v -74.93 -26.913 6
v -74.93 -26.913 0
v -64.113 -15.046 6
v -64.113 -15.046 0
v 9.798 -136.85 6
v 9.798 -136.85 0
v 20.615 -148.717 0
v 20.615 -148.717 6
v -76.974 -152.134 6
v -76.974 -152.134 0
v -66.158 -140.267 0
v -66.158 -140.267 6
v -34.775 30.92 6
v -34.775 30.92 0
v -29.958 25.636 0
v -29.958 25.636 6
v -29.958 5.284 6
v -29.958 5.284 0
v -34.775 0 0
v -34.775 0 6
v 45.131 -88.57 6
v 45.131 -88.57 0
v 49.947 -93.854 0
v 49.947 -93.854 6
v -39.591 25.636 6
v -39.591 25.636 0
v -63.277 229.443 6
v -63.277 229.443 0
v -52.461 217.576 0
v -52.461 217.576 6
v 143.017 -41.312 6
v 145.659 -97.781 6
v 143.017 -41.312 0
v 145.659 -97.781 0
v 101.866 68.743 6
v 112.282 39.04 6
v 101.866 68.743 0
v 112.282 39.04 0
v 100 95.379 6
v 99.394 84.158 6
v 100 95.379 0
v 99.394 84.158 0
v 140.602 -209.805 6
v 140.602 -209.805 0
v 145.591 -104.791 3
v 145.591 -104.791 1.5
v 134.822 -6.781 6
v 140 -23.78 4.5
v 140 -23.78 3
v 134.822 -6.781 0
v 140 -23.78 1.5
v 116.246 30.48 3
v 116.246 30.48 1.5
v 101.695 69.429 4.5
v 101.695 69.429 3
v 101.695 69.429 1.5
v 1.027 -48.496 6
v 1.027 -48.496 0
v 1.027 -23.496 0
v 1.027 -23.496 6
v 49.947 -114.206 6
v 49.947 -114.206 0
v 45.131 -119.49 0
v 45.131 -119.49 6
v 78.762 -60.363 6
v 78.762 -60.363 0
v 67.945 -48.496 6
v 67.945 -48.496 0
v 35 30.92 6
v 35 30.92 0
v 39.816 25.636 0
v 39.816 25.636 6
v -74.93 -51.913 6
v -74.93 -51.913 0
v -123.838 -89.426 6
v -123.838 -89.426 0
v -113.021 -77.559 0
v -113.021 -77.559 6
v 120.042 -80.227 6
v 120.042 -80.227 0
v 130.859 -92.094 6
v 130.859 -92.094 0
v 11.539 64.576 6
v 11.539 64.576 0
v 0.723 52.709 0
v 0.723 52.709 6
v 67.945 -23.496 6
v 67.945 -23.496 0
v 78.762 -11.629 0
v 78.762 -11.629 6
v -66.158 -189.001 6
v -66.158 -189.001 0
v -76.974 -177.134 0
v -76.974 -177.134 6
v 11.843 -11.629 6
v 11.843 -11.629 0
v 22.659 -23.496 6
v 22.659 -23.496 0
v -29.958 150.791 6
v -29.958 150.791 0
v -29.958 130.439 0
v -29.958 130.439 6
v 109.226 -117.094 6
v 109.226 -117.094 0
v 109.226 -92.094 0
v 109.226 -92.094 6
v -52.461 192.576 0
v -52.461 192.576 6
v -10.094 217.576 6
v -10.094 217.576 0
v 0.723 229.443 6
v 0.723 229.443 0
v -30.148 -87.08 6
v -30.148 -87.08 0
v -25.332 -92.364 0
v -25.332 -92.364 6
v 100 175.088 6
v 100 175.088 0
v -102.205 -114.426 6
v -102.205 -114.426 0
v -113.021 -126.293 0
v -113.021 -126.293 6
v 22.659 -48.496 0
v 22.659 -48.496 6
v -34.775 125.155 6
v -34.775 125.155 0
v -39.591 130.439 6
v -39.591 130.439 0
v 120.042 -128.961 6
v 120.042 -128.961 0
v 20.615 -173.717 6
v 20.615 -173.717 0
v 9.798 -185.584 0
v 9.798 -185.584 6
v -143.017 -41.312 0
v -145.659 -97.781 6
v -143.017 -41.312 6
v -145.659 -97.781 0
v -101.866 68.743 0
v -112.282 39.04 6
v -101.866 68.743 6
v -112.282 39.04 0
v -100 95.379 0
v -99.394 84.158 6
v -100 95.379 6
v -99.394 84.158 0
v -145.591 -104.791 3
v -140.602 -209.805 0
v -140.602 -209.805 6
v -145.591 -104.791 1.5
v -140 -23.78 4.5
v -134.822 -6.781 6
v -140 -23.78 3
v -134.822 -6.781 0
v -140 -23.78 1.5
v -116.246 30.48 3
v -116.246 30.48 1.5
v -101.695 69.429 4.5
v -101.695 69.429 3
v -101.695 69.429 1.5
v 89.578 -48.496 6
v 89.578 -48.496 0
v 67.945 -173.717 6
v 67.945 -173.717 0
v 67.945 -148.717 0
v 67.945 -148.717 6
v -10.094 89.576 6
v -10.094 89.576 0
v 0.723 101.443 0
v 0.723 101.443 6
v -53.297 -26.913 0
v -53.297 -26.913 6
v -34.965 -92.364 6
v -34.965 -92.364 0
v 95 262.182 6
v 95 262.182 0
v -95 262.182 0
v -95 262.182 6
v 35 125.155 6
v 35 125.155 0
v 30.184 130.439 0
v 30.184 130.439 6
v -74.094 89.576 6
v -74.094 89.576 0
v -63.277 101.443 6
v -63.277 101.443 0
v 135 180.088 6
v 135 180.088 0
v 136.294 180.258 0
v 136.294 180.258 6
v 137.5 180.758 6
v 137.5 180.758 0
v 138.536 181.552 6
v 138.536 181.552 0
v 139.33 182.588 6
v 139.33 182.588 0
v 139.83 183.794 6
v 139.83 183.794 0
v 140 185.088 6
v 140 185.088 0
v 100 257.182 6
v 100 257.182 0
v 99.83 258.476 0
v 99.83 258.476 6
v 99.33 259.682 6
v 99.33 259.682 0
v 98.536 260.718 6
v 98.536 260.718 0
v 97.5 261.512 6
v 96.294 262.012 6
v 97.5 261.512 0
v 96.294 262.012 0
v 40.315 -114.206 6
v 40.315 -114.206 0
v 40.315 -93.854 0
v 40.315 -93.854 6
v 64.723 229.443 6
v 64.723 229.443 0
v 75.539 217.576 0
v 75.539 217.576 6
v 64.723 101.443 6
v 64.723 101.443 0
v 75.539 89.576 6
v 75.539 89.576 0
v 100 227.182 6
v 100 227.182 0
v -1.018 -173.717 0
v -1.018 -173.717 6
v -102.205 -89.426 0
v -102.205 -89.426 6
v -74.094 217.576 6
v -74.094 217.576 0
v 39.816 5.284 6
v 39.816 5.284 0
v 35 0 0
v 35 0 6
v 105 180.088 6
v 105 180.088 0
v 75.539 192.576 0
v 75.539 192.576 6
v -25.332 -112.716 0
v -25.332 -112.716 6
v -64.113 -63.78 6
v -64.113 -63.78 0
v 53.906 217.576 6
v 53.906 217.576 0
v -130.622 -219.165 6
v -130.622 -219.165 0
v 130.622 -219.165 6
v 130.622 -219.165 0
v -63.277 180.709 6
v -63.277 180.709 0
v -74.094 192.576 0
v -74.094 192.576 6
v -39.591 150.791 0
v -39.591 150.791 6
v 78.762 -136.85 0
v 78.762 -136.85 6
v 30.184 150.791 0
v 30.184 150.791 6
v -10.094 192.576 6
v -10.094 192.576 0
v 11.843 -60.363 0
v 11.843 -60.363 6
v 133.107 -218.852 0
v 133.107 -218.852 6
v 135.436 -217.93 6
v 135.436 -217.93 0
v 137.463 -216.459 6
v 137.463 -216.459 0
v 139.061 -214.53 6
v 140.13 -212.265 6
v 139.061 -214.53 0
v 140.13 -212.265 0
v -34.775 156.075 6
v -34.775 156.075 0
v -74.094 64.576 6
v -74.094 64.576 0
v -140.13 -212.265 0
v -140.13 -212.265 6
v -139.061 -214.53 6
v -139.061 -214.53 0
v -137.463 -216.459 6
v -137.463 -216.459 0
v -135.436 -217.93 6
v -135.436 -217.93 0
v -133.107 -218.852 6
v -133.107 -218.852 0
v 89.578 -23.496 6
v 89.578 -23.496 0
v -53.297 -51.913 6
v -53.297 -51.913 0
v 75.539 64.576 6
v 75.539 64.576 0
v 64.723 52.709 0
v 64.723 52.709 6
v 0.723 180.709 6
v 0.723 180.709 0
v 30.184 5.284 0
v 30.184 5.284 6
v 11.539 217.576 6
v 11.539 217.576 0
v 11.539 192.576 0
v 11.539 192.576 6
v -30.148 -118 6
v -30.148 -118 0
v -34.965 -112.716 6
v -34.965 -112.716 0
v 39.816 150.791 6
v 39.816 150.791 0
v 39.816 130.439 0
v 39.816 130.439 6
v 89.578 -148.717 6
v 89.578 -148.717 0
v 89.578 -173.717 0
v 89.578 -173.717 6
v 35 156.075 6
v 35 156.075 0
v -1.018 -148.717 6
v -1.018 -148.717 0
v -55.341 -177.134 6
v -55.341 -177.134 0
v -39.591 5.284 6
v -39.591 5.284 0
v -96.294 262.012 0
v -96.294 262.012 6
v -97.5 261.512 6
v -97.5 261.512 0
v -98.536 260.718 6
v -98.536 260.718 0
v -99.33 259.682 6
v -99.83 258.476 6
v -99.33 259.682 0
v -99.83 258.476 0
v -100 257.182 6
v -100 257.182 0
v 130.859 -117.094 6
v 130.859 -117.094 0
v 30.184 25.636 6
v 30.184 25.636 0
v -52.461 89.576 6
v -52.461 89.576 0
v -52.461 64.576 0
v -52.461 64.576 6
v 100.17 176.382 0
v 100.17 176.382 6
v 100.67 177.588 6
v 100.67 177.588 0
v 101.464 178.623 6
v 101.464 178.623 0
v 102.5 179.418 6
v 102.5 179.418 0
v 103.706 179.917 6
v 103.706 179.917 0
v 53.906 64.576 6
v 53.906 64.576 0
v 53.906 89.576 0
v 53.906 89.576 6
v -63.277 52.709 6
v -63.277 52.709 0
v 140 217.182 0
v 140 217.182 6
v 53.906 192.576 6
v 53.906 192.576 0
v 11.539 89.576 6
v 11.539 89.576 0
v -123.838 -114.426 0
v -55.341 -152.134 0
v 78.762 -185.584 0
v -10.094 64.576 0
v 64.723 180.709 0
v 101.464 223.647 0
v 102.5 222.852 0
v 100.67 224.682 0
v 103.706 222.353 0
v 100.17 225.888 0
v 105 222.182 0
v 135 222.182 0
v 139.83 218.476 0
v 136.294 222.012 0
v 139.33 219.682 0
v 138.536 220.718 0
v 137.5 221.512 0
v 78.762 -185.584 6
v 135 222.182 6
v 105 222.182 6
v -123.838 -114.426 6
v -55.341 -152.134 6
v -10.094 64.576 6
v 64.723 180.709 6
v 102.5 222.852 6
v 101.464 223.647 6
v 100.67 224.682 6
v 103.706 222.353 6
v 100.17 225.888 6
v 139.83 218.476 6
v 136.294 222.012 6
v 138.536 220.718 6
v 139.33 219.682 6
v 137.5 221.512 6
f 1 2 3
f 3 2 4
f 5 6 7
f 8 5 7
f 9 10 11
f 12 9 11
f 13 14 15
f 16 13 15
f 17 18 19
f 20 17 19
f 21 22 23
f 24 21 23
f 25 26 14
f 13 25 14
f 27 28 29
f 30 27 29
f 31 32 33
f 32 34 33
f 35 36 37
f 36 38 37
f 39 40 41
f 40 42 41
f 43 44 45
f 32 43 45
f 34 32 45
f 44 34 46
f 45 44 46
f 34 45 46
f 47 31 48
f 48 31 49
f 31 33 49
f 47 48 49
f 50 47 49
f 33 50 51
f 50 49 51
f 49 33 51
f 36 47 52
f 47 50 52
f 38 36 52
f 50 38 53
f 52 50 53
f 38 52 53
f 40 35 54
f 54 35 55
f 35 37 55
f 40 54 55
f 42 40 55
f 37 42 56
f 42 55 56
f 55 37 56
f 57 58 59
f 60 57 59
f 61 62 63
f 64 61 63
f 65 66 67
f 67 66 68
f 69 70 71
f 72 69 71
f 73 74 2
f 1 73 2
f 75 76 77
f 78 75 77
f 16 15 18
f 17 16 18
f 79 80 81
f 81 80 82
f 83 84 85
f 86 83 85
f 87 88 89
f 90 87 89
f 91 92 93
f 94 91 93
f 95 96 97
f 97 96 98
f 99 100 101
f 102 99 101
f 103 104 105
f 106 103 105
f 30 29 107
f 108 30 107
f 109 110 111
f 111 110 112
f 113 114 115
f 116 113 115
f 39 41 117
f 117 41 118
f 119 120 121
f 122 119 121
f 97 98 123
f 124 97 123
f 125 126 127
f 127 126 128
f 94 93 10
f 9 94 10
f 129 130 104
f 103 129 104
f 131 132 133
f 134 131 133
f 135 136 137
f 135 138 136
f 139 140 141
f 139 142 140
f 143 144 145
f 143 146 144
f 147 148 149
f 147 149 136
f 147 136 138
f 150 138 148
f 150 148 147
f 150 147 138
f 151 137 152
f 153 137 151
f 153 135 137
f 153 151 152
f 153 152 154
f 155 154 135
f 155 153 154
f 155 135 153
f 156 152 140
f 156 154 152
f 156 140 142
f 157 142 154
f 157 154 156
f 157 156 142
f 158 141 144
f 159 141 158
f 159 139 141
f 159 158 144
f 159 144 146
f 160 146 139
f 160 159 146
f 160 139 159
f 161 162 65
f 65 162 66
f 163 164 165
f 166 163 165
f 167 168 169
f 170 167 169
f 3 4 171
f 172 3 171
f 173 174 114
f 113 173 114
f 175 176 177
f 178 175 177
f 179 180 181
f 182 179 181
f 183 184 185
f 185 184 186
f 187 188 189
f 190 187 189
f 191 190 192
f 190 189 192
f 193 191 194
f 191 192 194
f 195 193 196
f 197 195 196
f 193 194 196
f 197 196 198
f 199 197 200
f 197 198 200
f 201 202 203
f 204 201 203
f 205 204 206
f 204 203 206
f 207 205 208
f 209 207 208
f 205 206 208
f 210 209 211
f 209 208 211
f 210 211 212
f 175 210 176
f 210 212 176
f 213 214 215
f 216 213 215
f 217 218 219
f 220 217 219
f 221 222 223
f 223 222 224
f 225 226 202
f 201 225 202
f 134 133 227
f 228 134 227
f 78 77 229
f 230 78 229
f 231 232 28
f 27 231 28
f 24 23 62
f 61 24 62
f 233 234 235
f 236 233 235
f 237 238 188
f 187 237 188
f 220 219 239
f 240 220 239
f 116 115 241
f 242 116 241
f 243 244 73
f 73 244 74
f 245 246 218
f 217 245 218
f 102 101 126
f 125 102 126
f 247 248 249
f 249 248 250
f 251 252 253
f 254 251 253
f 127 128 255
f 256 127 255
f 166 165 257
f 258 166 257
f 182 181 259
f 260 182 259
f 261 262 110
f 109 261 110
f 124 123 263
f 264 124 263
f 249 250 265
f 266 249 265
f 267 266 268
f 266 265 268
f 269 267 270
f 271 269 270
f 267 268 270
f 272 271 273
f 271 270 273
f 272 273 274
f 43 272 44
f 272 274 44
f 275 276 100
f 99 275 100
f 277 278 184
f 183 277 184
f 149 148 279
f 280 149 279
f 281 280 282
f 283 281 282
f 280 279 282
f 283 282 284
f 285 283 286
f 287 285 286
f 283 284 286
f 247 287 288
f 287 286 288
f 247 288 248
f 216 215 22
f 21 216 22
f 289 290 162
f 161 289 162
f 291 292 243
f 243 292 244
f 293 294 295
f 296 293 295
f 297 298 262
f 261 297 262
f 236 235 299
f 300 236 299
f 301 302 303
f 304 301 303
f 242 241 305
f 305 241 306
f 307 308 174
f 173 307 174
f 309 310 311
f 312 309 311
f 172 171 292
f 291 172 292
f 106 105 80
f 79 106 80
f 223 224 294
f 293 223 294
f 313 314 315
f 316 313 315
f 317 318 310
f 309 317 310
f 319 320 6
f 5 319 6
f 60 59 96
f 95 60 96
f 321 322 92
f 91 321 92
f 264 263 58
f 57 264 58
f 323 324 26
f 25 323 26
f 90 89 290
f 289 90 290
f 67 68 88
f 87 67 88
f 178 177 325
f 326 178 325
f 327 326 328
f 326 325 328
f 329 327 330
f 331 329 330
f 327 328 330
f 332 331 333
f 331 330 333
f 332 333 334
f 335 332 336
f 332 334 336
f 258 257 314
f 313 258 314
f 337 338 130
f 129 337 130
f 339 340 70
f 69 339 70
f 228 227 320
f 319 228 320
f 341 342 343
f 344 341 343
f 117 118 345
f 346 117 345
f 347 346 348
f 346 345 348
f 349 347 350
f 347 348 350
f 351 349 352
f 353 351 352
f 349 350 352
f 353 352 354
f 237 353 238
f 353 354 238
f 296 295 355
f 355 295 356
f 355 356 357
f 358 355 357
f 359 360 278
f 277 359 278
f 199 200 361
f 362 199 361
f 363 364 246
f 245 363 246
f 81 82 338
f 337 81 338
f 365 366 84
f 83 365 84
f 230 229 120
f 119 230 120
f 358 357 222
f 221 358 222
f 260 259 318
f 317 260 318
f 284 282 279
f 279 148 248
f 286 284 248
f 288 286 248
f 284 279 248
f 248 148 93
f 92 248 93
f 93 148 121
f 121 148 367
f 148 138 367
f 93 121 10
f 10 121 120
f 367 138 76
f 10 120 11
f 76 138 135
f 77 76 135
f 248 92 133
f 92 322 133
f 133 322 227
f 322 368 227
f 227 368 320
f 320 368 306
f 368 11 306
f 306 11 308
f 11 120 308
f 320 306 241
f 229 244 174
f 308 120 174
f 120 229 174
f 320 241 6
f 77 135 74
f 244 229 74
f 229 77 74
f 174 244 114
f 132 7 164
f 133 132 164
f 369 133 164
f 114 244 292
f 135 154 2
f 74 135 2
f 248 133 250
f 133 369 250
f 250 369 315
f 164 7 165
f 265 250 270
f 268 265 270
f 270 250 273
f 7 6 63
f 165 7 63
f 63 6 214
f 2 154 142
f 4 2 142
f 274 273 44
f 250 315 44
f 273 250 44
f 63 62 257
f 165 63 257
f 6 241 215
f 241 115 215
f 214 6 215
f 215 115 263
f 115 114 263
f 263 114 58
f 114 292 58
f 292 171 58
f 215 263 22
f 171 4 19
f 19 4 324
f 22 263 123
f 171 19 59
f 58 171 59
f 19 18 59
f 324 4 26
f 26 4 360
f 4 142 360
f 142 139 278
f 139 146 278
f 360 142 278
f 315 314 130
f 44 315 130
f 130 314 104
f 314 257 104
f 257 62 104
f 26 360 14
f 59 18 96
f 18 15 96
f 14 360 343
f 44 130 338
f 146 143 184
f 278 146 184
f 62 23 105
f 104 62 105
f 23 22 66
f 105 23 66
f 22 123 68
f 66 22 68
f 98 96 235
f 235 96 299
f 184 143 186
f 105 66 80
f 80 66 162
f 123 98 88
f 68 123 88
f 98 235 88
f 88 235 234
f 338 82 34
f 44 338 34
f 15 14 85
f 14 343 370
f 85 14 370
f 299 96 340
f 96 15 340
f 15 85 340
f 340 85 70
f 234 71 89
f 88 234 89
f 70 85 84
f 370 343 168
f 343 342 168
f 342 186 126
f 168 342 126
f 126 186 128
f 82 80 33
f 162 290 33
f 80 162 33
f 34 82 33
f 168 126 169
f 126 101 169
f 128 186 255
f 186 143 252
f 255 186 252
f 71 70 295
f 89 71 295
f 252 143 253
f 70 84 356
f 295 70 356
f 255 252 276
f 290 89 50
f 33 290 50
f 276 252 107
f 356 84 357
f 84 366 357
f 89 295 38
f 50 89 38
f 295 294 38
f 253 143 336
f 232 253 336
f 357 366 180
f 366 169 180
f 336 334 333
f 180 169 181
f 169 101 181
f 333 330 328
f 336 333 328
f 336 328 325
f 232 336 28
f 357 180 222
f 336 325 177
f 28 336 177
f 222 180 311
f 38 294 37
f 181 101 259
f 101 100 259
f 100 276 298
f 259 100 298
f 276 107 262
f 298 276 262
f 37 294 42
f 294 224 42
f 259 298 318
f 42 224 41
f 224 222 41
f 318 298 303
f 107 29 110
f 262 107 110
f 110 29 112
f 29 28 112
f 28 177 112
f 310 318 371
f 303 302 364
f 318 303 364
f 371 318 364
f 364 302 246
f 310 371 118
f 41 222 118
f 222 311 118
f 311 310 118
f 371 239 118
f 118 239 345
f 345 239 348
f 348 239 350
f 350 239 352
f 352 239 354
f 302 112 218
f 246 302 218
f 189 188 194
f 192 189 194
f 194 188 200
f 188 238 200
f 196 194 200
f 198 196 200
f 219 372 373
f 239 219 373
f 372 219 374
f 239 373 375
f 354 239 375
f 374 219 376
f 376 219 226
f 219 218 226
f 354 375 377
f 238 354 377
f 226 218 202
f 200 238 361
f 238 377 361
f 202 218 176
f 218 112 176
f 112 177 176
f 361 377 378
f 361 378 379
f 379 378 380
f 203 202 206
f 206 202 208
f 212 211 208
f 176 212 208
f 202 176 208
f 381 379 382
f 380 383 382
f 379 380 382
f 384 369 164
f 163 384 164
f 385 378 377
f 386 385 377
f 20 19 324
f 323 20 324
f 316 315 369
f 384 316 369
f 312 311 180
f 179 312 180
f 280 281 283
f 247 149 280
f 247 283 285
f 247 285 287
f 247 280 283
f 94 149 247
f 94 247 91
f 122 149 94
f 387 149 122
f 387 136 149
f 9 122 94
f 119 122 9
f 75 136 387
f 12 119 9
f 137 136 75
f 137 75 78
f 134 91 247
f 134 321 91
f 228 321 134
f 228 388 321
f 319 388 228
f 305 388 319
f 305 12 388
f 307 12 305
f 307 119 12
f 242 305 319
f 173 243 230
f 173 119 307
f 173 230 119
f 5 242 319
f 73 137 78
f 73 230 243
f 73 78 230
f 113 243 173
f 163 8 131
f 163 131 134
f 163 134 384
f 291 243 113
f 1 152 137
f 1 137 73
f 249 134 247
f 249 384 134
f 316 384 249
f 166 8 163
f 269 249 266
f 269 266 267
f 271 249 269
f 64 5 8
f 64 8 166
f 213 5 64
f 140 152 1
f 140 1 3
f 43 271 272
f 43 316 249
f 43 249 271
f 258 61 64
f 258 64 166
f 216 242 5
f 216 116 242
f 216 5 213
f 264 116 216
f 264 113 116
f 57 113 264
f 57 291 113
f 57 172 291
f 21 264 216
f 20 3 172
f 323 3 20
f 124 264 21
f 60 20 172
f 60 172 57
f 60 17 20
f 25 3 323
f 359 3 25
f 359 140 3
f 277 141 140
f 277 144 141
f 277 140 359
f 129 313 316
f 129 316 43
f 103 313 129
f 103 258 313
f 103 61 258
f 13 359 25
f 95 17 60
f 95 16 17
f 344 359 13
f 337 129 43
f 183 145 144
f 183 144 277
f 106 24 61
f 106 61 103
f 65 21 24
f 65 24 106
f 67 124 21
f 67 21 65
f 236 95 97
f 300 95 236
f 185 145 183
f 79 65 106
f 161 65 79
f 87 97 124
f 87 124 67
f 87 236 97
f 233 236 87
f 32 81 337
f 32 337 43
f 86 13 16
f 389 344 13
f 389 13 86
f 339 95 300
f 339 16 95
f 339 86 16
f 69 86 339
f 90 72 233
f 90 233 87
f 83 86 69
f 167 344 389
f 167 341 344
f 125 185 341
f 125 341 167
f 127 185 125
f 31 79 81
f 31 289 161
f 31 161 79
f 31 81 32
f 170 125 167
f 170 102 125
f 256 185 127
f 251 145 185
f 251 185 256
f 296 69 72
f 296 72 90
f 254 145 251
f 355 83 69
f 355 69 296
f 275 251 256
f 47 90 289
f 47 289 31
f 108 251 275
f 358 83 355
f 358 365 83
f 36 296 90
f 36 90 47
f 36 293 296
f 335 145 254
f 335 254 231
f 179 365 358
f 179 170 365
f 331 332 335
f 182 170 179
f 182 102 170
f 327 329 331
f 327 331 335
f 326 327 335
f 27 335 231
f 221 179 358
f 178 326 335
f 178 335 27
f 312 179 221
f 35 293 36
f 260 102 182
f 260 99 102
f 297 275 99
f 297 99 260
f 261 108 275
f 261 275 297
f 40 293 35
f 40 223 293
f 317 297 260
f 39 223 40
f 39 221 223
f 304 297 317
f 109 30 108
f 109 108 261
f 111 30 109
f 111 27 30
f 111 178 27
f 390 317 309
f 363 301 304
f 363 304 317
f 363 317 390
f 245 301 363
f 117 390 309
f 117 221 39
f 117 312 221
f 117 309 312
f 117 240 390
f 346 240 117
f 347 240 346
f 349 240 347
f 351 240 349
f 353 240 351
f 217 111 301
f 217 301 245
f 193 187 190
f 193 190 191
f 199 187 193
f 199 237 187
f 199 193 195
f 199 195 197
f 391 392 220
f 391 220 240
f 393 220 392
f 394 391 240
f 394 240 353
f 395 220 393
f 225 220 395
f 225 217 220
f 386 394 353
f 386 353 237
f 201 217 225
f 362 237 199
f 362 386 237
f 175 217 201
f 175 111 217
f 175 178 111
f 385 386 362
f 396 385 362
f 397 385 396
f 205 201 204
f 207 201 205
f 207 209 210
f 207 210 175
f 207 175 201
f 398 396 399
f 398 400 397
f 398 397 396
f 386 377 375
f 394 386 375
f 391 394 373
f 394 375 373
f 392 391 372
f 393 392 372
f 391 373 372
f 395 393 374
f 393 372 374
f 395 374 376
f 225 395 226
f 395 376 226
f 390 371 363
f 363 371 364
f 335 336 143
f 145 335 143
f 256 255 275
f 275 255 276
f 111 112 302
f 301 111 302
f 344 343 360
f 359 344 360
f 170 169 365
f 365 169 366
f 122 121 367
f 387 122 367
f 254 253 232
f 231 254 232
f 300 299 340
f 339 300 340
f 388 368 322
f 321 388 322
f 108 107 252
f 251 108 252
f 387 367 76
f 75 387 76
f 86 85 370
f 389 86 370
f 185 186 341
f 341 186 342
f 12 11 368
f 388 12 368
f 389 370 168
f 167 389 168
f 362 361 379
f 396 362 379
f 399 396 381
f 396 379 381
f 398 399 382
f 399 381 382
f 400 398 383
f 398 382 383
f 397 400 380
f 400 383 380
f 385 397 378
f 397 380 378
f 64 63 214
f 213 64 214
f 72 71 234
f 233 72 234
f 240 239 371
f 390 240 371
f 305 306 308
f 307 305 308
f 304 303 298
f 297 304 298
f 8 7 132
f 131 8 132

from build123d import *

# Parameters (mm, degrees)
F1_DEPTH = 6


with BuildPart() as f1:
    # F0 (on Top) → F1 (new body)
    with BuildSketch(Plane.XY):
        with BuildLine():
            Line((95, 262.1821570396), (0, 262.1821570396))
            Line((0, 262.1821570396), (-95, 262.1821570396))
            ThreePointArc((-95, 262.1821570396), (-98.5355339059, 260.7176909456), (-100, 257.1821570396))
            Line((-100, 257.1821570396), (-100, 95.3790545464))
            add(Edge.make_bspline(
                [(-140.6018761806, -209.8051889464), (-145.28862702, -136.7092151999), (-151.7930566351, -23.6301706956), (-115.64488398, 25.6274545282), (-97.9540393108, 76.553678361), (-99.4446328149, 90.2689875565), (-100, 95.3790545464)],
                knots=[0.0173618711, 0.0173618711, 0.0173618711, 0.0173618711, 0.4243124, 0.6579372091, 0.8725538192, 1, 1, 1, 1], degree=3))
            ThreePointArc((-140.6018761806, -209.8051889464), (-137.4634707904, -216.4591114866), (-130.6223684602, -219.1653251648))
            Line((-130.6223684602, -219.1653251648), (130.6223684602, -219.1653251648))
            ThreePointArc((130.6223684602, -219.1653251648), (137.4634707904, -216.4591114866), (140.6018761806, -209.8051889464))
            add(Edge.make_bspline(
                [(140.6018761806, -209.8051889464), (145.28862702, -136.7092151999), (151.7930566351, -23.6301706956), (115.64488398, 25.6274545282), (97.9540393108, 76.553678361), (99.4446328149, 90.2689875565), (100, 95.3790545464)],
                knots=[0.0173618711, 0.0173618711, 0.0173618711, 0.0173618711, 0.4243124, 0.6579372091, 0.8725538192, 1, 1, 1, 1], degree=3))
            Line((100, 95.3790545464), (100, 175.0877600908))
            ThreePointArc((100, 175.0877600908), (101.4644660941, 178.6232939968), (105, 180.0877600908))
            Line((105, 180.0877600908), (135, 180.0877600908))
            ThreePointArc((135, 180.0877600908), (138.5355339059, 181.5522261849), (140, 185.0877600908))
            Line((140, 185.0877600908), (140, 217.1821570396))
            ThreePointArc((140, 217.1821570396), (138.5355339059, 220.7176909456), (135, 222.1821570396))
            Line((135, 222.1821570396), (105, 222.1821570396))
            ThreePointArc((105, 222.1821570396), (101.4644660941, 223.6466231337), (100, 227.1821570396))
            Line((100, 227.1821570396), (100, 257.1821570396))
            ThreePointArc((100, 257.1821570396), (98.5355339059, 260.7176909456), (95, 262.1821570396))
        make_face()
        Polygon((-113.0212247372, -77.5594741106), (-102.2047810256, -89.4264161587), (-102.2047810256, -114.4264161587), (-113.0212247372, -126.2933582067), (-123.8376684487, -114.4264161587), (-123.8376684487, -89.4264161587), align=None, mode=Mode.SUBTRACT)
        Polygon((-76.974330689, -177.1341983843), (-76.974330689, -152.1341983843), (-66.1578869775, -140.2672563362), (-55.3414432659, -152.1341983843), (-55.3414432659, -177.1341983843), (-66.1578869775, -189.0011404323), align=None, mode=Mode.SUBTRACT)
        Polygon((-34.964894978, -112.7157764564), (-34.964894978, -92.3640566064), (-30.1484465599, -87.0798323475), (-25.3319981418, -92.3640566064), (-25.3319981418, -112.7157764564), (-30.1484465599, -118.0000007153), align=None, mode=Mode.SUBTRACT)
        Polygon((-64.1132891178, -15.046416223), (-53.2968454063, -26.9133582711), (-53.2968454063, -51.9133582711), (-64.1132891178, -63.7803003192), (-74.9297328293, -51.9133582711), (-74.9297328293, -26.9133582711), align=None, mode=Mode.SUBTRACT)
        Polygon((-39.5913329997, 5.2842242589), (-39.5913329997, 25.6359441089), (-34.7748845816, 30.9201683677), (-29.9584361635, 25.6359441089), (-29.9584361635, 5.2842242589), (-34.7748845816, 0), align=None, mode=Mode.SUBTRACT)
        Polygon((-1.0179981434, -173.7170352519), (-1.0179981434, -148.7170352519), (9.7984455681, -136.8500932038), (20.6148892796, -148.7170352519), (20.6148892796, -173.7170352519), (9.7984455681, -185.5839772999), align=None, mode=Mode.SUBTRACT)
        Polygon((40.3145010493, -114.2058925758), (40.3145010493, -93.8541727258), (45.1309494674, -88.5699484669), (49.9473978855, -93.8541727258), (49.9473978855, -114.2058925758), (45.1309494674, -119.4901168346), align=None, mode=Mode.SUBTRACT)
        Polygon((78.761510551, -136.8500932038), (89.5779542625, -148.7170352519), (89.5779542625, -173.7170352519), (78.761510551, -185.5839772999), (67.9450668395, -173.7170352519), (67.9450668395, -148.7170352519), align=None, mode=Mode.SUBTRACT)
        Polygon((120.0424358249, -80.2271872759), (130.8588795364, -92.094129324), (130.8588795364, -117.094129324), (120.0424358249, -128.961071372), (109.2259921134, -117.094129324), (109.2259921134, -92.094129324), align=None, mode=Mode.SUBTRACT)
        Polygon((1.0265997163, -48.4961951387), (1.0265997163, -23.4961951387), (11.8430434278, -11.6292530907), (22.6594871393, -23.4961951387), (22.6594871393, -48.4961951387), (11.8430434278, -60.3631371868), align=None, mode=Mode.SUBTRACT)
        Polygon((30.1835480056, 5.2842242589), (30.1835480056, 25.6359441089), (34.9999964237, 30.9201683677), (39.8164448418, 25.6359441089), (39.8164448418, 5.2842242589), (34.9999964237, 0), align=None, mode=Mode.SUBTRACT)
        Polygon((78.761510551, -11.6292530907), (89.5779542625, -23.4961951387), (89.5779542625, -48.4961951387), (78.761510551, -60.3631371868), (67.9450668395, -48.4961951387), (67.9450668395, -23.4961951387), align=None, mode=Mode.SUBTRACT)
        Polygon((-74.0937069058, 64.5764083862), (-74.0937069058, 89.5764083862), (-63.2772631943, 101.4433504343), (-52.4608194828, 89.5764083862), (-52.4608194828, 64.5764083862), (-63.2772631943, 52.7094663382), align=None, mode=Mode.SUBTRACT)
        Polygon((-39.591331137, 130.4391115935), (-39.591331137, 150.7908314435), (-34.7748827189, 156.0750557024), (-29.9584343008, 150.7908314435), (-29.9584343008, 130.4391115935), (-34.7748827189, 125.1548873346), align=None, mode=Mode.SUBTRACT)
        Polygon((-63.2772631943, 229.4433504343), (-52.4608194828, 217.5764083862), (-52.4608194828, 192.5764083862), (-63.2772631943, 180.7094663382), (-74.0937069058, 192.5764083862), (-74.0937069058, 217.5764083862), align=None, mode=Mode.SUBTRACT)
        Polygon((-10.0937069058, 64.5764083862), (-10.0937069058, 89.5764083862), (0.7227368057, 101.4433504343), (11.5391805172, 89.5764083862), (11.5391805172, 64.5764083862), (0.7227368057, 52.7094663382), align=None, mode=Mode.SUBTRACT)
        Polygon((53.9062930942, 64.5764083862), (53.9062930942, 89.5764083862), (64.7227368057, 101.4433504343), (75.5391805172, 89.5764083862), (75.5391805172, 64.5764083862), (64.7227368057, 52.7094663382), align=None, mode=Mode.SUBTRACT)
        Polygon((30.1835480056, 130.4391115935), (30.1835480056, 150.7908314435), (34.9999964237, 156.0750557024), (39.8164448418, 150.7908314435), (39.8164448418, 130.4391115935), (34.9999964237, 125.1548873346), align=None, mode=Mode.SUBTRACT)
        Polygon((-10.0937069058, 192.5764083862), (-10.0937069058, 217.5764083862), (0.7227368057, 229.4433504343), (11.5391805172, 217.5764083862), (11.5391805172, 192.5764083862), (0.7227368057, 180.7094663382), align=None, mode=Mode.SUBTRACT)
        Polygon((53.9062930942, 192.5764083862), (53.9062930942, 217.5764083862), (64.7227368057, 229.4433504343), (75.5391805172, 217.5764083862), (75.5391805172, 192.5764083862), (64.7227368057, 180.7094663382), align=None, mode=Mode.SUBTRACT)
    extrude(amount=F1_DEPTH)


solid = f1.part
